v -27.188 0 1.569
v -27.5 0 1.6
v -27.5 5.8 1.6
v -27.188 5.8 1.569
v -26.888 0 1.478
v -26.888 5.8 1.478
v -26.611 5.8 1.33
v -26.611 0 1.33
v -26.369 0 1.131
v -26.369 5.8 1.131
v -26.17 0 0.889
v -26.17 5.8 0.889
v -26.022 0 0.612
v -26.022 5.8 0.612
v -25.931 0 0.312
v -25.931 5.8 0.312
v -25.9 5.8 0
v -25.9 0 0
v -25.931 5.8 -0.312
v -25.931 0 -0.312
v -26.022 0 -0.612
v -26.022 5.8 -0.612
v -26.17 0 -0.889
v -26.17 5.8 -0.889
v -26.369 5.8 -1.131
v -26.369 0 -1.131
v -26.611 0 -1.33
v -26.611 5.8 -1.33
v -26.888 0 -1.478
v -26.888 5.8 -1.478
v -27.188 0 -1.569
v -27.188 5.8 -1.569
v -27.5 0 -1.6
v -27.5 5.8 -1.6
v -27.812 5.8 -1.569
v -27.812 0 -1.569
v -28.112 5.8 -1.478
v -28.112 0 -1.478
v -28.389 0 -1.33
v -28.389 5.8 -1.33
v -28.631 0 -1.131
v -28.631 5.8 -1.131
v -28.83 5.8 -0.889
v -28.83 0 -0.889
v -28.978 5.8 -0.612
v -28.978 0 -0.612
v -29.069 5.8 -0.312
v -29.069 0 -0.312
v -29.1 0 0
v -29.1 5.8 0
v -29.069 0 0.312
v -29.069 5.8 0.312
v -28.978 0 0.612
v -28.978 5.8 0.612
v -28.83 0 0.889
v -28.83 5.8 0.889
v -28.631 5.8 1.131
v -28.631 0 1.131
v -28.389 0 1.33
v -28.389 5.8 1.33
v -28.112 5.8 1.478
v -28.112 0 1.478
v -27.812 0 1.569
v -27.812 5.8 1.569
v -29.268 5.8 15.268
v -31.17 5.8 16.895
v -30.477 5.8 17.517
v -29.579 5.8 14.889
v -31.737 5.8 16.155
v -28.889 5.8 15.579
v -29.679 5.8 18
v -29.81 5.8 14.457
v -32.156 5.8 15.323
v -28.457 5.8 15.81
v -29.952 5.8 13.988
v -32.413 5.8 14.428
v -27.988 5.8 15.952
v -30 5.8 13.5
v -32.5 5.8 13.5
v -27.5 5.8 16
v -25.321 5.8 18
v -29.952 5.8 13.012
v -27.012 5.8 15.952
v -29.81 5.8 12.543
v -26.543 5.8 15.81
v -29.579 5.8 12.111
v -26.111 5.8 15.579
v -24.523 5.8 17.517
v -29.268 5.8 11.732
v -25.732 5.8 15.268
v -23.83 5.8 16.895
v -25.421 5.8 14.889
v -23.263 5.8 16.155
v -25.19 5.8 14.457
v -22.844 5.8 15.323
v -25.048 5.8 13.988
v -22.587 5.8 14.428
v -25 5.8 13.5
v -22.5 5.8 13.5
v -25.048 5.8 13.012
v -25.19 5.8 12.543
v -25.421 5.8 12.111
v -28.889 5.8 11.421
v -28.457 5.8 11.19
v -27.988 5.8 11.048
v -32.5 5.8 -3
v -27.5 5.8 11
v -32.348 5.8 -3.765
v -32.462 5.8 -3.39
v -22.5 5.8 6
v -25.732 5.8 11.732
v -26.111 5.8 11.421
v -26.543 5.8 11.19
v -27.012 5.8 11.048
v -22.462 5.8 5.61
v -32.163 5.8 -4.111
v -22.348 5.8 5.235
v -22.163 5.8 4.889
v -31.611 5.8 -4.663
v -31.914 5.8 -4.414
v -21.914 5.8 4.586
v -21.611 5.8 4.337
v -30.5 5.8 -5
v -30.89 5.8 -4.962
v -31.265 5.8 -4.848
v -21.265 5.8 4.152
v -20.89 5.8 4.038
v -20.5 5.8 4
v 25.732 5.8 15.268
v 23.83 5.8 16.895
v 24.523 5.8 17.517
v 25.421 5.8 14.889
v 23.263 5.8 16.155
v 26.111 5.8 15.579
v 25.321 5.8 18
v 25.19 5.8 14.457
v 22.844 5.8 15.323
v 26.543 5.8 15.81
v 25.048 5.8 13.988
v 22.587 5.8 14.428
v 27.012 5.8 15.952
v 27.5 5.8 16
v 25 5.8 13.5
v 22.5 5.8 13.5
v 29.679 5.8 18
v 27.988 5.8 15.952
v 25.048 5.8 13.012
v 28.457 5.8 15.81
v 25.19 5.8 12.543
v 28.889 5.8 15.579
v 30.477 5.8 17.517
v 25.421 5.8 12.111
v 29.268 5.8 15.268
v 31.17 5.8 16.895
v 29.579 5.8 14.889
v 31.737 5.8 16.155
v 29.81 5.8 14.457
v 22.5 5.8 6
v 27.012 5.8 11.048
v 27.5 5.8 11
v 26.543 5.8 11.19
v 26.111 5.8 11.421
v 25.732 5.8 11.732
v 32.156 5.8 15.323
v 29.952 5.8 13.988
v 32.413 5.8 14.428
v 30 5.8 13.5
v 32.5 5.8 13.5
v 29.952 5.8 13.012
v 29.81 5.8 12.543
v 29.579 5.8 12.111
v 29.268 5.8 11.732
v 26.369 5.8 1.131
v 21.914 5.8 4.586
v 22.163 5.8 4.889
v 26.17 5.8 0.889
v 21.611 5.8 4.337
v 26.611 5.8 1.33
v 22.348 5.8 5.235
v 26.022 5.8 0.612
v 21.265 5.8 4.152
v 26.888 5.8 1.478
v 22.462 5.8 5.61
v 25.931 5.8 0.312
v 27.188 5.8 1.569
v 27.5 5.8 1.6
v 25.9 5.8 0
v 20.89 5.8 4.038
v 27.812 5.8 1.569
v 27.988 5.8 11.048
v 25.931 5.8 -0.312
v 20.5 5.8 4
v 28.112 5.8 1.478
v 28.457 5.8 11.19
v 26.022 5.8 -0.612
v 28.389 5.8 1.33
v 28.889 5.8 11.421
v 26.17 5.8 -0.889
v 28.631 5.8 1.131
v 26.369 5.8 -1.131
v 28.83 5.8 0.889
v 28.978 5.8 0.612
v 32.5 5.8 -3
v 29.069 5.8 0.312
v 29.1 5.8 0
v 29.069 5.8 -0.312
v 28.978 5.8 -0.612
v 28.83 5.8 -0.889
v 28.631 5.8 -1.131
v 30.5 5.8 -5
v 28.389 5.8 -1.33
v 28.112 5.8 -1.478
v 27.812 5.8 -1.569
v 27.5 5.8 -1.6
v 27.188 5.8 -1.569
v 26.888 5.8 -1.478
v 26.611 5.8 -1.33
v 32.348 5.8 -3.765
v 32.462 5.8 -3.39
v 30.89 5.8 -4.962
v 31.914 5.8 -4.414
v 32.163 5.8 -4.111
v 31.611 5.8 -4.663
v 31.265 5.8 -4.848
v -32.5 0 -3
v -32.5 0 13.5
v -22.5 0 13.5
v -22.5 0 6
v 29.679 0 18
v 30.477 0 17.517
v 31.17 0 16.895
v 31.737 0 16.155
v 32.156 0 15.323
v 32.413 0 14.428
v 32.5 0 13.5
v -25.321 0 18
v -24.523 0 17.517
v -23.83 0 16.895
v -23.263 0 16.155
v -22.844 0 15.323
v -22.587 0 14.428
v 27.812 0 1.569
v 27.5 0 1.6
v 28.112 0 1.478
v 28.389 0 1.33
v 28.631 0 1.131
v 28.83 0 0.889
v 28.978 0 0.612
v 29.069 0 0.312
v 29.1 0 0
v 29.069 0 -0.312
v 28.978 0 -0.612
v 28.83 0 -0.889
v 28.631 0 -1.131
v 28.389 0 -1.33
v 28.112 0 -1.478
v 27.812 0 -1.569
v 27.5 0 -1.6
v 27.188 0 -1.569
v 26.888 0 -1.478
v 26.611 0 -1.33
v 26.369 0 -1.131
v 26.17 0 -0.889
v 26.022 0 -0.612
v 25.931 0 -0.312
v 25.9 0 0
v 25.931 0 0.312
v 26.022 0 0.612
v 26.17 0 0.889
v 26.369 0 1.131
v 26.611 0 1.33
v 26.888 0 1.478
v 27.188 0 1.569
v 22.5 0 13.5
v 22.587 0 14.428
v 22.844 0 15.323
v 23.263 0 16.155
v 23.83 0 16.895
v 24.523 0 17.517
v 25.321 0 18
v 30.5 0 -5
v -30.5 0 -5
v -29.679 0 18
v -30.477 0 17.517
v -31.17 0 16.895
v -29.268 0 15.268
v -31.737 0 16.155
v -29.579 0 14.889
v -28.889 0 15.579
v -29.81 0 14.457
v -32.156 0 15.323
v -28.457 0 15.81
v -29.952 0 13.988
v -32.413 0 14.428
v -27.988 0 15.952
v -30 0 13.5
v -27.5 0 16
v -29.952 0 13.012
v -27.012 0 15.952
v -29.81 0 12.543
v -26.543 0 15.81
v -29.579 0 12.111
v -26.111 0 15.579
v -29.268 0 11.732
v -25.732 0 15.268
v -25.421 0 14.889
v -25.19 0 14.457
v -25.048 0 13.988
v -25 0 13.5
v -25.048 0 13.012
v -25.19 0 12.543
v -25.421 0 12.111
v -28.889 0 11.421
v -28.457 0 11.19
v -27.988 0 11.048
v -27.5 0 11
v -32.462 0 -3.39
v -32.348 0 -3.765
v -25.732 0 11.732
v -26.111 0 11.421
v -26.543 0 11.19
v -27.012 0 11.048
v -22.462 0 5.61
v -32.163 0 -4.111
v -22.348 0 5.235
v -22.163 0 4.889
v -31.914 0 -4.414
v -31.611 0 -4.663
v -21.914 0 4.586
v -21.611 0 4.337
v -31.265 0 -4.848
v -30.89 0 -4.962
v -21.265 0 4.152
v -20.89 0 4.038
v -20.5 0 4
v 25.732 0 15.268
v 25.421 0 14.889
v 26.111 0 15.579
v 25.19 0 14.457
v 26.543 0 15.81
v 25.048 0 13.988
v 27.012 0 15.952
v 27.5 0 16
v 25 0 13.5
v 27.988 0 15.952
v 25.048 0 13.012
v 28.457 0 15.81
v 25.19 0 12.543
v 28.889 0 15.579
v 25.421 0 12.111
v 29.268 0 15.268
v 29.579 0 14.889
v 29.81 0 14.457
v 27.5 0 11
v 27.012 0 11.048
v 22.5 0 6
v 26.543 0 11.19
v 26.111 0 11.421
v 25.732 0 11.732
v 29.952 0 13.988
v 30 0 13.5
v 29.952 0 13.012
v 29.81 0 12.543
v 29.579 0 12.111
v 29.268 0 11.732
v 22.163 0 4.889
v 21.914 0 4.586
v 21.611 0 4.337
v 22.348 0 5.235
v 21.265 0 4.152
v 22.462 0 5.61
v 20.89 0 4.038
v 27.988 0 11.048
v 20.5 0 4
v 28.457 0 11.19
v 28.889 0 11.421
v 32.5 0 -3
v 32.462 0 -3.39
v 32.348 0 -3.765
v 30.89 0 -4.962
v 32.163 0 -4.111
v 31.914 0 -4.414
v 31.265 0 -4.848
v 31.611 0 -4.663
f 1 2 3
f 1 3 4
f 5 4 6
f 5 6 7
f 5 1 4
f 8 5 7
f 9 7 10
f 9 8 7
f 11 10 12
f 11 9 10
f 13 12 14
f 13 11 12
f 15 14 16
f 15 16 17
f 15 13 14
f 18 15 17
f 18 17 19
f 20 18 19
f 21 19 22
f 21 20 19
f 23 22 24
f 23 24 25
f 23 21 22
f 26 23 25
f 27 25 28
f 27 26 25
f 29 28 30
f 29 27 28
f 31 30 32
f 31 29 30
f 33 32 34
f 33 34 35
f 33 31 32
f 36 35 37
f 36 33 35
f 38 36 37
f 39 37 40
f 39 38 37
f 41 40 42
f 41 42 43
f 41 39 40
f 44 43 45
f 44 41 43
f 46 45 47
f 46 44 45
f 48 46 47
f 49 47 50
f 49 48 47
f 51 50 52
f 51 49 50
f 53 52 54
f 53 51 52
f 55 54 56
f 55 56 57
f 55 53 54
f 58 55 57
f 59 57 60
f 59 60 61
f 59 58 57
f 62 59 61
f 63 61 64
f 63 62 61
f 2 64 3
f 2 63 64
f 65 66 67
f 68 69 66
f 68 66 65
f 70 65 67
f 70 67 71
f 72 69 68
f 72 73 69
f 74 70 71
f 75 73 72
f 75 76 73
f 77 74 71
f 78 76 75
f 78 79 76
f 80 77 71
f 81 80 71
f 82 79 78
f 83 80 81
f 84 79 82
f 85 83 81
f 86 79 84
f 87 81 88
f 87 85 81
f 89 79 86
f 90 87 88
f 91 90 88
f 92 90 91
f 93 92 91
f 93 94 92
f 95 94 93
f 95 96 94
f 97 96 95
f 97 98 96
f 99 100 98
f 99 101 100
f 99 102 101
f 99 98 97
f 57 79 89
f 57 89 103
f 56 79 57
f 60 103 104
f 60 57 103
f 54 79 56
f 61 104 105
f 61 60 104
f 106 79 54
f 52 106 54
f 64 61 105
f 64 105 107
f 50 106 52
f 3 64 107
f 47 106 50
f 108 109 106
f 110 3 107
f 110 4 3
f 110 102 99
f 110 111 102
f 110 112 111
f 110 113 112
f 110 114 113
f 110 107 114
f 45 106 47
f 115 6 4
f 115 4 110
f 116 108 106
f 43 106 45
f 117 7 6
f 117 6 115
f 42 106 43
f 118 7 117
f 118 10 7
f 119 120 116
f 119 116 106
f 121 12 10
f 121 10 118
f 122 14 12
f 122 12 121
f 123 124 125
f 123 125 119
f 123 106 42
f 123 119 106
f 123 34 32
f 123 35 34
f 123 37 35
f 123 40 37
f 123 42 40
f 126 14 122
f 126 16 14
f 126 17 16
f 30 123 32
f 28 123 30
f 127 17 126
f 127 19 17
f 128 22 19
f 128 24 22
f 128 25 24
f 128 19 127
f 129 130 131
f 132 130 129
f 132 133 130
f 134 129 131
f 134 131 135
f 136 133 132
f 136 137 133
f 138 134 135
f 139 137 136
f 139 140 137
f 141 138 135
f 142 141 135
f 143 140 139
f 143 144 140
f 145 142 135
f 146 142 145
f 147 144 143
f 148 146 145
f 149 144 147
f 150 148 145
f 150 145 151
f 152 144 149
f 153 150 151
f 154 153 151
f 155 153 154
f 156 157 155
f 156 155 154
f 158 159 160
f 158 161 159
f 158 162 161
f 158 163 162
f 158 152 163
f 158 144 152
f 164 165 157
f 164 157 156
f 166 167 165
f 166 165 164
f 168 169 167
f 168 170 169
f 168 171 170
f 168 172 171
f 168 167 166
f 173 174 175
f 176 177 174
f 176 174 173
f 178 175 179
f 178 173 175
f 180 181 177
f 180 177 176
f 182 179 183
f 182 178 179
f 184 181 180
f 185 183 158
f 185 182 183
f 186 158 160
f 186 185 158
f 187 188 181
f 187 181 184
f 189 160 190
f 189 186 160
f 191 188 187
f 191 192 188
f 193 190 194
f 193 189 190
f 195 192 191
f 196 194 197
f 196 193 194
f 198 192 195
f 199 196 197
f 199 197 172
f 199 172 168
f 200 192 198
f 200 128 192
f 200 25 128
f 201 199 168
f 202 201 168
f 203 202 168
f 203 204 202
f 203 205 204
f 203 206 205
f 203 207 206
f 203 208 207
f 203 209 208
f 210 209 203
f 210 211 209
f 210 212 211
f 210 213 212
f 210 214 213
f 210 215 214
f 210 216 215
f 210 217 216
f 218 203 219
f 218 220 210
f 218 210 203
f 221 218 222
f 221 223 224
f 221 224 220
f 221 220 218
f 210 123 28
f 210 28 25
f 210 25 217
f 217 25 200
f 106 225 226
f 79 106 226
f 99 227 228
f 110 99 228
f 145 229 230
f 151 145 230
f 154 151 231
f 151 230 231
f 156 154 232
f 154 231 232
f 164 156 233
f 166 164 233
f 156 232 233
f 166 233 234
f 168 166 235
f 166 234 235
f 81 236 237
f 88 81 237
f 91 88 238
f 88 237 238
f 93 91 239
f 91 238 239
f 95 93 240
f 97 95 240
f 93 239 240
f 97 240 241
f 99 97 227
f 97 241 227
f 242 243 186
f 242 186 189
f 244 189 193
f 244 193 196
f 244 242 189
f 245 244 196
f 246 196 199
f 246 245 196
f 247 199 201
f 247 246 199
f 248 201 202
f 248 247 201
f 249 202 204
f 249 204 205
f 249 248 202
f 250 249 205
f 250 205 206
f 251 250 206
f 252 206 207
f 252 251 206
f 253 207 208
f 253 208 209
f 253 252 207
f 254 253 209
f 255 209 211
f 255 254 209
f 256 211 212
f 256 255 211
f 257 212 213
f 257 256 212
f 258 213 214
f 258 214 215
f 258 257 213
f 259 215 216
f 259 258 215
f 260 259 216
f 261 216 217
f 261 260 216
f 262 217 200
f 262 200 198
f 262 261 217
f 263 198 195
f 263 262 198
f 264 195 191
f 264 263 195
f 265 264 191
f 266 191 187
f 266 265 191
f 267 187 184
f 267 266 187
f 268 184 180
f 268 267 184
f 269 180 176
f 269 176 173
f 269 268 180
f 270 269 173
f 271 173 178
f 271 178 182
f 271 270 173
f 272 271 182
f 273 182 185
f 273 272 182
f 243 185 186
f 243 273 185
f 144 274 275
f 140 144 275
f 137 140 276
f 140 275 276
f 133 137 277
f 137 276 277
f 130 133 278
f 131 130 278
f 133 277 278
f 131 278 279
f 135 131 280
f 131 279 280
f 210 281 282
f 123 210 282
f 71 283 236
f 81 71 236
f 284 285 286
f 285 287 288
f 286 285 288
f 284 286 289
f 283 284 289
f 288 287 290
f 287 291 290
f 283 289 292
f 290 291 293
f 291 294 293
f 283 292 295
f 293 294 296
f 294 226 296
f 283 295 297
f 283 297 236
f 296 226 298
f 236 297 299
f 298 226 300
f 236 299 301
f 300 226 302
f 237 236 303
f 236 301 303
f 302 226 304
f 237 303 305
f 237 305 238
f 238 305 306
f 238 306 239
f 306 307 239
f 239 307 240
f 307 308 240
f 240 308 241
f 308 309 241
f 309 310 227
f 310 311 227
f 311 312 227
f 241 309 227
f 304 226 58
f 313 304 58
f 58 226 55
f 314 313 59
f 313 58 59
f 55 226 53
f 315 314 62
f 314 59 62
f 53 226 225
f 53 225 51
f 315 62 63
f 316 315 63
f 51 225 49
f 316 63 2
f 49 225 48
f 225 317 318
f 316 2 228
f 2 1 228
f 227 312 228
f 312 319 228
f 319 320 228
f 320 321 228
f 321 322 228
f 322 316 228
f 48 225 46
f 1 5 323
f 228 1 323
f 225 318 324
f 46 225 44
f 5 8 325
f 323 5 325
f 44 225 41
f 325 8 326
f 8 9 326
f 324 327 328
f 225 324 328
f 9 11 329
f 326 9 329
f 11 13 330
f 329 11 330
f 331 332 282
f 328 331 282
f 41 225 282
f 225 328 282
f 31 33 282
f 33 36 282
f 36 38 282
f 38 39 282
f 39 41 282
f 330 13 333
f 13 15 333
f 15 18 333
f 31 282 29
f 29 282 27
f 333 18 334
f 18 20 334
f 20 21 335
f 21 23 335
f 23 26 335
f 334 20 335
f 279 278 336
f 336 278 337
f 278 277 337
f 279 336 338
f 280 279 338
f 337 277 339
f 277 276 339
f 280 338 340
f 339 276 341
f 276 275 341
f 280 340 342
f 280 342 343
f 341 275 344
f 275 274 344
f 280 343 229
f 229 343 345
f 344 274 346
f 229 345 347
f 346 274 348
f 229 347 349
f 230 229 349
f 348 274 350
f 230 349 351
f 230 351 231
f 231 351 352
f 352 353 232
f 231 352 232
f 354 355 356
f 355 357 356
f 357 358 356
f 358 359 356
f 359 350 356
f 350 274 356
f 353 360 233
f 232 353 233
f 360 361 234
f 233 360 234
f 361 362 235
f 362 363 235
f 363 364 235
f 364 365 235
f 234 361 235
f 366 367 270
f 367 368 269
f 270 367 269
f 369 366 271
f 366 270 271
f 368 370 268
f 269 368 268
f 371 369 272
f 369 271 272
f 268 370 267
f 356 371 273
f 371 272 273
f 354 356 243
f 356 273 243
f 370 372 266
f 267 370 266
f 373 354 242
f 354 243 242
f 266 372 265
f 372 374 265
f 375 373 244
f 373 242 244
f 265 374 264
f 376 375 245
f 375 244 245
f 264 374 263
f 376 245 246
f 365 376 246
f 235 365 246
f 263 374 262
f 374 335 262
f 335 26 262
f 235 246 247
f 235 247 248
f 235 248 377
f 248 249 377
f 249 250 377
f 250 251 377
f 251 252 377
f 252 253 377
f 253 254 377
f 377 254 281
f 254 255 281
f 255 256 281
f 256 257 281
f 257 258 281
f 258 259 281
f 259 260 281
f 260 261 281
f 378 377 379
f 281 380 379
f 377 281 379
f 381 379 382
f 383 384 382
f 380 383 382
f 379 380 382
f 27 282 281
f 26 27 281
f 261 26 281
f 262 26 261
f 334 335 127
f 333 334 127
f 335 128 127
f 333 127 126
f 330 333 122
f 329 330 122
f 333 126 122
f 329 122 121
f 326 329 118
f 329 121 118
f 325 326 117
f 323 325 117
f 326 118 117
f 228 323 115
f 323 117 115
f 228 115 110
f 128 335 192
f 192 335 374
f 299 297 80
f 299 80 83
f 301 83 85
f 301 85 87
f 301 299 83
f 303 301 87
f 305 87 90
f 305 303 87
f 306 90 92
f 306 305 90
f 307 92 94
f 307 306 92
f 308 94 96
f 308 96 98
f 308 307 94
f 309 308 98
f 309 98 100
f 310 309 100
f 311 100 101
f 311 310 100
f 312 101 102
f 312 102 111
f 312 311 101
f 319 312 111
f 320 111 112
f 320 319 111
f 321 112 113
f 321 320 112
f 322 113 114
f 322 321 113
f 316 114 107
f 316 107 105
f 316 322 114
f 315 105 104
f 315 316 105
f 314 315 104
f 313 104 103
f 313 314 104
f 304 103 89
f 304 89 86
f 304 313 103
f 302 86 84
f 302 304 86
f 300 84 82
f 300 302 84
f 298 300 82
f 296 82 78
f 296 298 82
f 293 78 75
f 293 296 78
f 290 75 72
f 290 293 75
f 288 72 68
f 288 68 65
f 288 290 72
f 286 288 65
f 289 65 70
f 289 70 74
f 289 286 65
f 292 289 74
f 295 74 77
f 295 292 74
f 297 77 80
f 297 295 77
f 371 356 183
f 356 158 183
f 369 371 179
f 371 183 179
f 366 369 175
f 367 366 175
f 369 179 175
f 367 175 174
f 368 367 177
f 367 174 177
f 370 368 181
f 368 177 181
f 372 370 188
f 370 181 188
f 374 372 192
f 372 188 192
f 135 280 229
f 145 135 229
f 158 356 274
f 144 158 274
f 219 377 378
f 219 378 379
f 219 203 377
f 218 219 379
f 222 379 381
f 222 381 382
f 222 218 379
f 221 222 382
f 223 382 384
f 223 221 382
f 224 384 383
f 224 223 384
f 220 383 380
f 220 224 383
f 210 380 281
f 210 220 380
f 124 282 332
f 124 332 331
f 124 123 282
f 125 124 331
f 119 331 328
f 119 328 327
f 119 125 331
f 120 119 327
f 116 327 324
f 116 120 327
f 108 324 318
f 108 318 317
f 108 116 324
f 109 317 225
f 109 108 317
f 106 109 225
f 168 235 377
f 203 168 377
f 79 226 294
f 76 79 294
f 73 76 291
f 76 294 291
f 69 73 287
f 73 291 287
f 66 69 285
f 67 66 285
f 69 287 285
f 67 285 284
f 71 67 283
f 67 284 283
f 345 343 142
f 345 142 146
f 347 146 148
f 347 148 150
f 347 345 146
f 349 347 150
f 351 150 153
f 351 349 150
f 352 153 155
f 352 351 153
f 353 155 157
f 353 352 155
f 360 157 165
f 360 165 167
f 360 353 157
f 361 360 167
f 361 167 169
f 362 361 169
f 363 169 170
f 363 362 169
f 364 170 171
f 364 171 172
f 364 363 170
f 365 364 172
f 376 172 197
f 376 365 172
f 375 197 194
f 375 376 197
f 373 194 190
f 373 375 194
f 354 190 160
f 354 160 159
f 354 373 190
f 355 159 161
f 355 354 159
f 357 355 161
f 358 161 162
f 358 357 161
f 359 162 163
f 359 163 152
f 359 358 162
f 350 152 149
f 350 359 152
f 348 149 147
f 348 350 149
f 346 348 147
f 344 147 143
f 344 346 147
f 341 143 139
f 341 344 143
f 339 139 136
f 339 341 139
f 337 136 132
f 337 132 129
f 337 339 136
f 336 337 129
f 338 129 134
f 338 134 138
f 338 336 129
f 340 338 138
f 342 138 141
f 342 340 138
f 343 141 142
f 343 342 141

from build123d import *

# Parameters (mm, degrees)
SKETCH_1_R      = 2.5
SKETCH_1_R_2    = 1.6
EXTRUDE_1_DEPTH = 5.8
FILLET_1_R      = 2


with BuildPart() as part:
    # ｽｹｯﾁ1 → ﾎﾞｽ - 押し出し1 (new body)
    with BuildSketch(Plane(origin=(0, 0, 0), x_dir=(1, 0, 0), z_dir=(0, 1, 0))):
        with BuildLine():
            ThreePointArc((29.679449472, -18), (31.736581603, -16.155442773), (32.5, -13.5))
            Line((32.5, -13.5), (32.5, -5))
            Line((32.5, -5), (32.5, 5))
            Line((32.5, 5), (-32.5, 5))
            Line((-32.5, 5), (-32.5, -5))
            Line((-32.5, -5), (-32.5, -13.5))
            ThreePointArc((-32.5, -13.5), (-31.736581603, -16.155442773), (-29.679449472, -18))
            Line((-29.679449472, -18), (-25.320550528, -18))
            ThreePointArc((-25.320550528, -18), (-23.263418397, -16.155442773), (-22.5, -13.5))
            Line((-22.5, -13.5), (-22.5, -4))
            Line((-22.5, -4), (22.5, -4))
            Line((22.5, -4), (22.5, -13.5))
            ThreePointArc((22.5, -13.5), (23.263418397, -16.155442773), (25.320550528, -18))
            Line((25.320550528, -18), (29.679449472, -18))
        make_face()
        with Locations(Location((-27.5, -13.5, 0), (0, 0, 270))):
            Circle(SKETCH_1_R, mode=Mode.SUBTRACT)
        with Locations(Location((27.5, -13.5, 0), (0, 0, 270))):
            Circle(SKETCH_1_R, mode=Mode.SUBTRACT)
        with Locations(Location((-27.5, 0, 0), (0, 0, 270))):
            Circle(SKETCH_1_R_2, mode=Mode.SUBTRACT)
        with Locations(Location((27.5, 0, 0), (0, 0, 270))):
            Circle(SKETCH_1_R_2, mode=Mode.SUBTRACT)
    extrude(amount=EXTRUDE_1_DEPTH)

    # ﾌｨﾚｯﾄ1
    fillet_1_edges = [part.edges().sort_by_distance(p)[0] for p in [
        (-32.5, 2.9, -5),
        (32.5, 2.9, -5),
        (22.5, 2.9, 4),
        (-22.5, 2.9, 4),
    ]]
    fillet(fillet_1_edges, radius=FILLET_1_R)


solid = part.part
